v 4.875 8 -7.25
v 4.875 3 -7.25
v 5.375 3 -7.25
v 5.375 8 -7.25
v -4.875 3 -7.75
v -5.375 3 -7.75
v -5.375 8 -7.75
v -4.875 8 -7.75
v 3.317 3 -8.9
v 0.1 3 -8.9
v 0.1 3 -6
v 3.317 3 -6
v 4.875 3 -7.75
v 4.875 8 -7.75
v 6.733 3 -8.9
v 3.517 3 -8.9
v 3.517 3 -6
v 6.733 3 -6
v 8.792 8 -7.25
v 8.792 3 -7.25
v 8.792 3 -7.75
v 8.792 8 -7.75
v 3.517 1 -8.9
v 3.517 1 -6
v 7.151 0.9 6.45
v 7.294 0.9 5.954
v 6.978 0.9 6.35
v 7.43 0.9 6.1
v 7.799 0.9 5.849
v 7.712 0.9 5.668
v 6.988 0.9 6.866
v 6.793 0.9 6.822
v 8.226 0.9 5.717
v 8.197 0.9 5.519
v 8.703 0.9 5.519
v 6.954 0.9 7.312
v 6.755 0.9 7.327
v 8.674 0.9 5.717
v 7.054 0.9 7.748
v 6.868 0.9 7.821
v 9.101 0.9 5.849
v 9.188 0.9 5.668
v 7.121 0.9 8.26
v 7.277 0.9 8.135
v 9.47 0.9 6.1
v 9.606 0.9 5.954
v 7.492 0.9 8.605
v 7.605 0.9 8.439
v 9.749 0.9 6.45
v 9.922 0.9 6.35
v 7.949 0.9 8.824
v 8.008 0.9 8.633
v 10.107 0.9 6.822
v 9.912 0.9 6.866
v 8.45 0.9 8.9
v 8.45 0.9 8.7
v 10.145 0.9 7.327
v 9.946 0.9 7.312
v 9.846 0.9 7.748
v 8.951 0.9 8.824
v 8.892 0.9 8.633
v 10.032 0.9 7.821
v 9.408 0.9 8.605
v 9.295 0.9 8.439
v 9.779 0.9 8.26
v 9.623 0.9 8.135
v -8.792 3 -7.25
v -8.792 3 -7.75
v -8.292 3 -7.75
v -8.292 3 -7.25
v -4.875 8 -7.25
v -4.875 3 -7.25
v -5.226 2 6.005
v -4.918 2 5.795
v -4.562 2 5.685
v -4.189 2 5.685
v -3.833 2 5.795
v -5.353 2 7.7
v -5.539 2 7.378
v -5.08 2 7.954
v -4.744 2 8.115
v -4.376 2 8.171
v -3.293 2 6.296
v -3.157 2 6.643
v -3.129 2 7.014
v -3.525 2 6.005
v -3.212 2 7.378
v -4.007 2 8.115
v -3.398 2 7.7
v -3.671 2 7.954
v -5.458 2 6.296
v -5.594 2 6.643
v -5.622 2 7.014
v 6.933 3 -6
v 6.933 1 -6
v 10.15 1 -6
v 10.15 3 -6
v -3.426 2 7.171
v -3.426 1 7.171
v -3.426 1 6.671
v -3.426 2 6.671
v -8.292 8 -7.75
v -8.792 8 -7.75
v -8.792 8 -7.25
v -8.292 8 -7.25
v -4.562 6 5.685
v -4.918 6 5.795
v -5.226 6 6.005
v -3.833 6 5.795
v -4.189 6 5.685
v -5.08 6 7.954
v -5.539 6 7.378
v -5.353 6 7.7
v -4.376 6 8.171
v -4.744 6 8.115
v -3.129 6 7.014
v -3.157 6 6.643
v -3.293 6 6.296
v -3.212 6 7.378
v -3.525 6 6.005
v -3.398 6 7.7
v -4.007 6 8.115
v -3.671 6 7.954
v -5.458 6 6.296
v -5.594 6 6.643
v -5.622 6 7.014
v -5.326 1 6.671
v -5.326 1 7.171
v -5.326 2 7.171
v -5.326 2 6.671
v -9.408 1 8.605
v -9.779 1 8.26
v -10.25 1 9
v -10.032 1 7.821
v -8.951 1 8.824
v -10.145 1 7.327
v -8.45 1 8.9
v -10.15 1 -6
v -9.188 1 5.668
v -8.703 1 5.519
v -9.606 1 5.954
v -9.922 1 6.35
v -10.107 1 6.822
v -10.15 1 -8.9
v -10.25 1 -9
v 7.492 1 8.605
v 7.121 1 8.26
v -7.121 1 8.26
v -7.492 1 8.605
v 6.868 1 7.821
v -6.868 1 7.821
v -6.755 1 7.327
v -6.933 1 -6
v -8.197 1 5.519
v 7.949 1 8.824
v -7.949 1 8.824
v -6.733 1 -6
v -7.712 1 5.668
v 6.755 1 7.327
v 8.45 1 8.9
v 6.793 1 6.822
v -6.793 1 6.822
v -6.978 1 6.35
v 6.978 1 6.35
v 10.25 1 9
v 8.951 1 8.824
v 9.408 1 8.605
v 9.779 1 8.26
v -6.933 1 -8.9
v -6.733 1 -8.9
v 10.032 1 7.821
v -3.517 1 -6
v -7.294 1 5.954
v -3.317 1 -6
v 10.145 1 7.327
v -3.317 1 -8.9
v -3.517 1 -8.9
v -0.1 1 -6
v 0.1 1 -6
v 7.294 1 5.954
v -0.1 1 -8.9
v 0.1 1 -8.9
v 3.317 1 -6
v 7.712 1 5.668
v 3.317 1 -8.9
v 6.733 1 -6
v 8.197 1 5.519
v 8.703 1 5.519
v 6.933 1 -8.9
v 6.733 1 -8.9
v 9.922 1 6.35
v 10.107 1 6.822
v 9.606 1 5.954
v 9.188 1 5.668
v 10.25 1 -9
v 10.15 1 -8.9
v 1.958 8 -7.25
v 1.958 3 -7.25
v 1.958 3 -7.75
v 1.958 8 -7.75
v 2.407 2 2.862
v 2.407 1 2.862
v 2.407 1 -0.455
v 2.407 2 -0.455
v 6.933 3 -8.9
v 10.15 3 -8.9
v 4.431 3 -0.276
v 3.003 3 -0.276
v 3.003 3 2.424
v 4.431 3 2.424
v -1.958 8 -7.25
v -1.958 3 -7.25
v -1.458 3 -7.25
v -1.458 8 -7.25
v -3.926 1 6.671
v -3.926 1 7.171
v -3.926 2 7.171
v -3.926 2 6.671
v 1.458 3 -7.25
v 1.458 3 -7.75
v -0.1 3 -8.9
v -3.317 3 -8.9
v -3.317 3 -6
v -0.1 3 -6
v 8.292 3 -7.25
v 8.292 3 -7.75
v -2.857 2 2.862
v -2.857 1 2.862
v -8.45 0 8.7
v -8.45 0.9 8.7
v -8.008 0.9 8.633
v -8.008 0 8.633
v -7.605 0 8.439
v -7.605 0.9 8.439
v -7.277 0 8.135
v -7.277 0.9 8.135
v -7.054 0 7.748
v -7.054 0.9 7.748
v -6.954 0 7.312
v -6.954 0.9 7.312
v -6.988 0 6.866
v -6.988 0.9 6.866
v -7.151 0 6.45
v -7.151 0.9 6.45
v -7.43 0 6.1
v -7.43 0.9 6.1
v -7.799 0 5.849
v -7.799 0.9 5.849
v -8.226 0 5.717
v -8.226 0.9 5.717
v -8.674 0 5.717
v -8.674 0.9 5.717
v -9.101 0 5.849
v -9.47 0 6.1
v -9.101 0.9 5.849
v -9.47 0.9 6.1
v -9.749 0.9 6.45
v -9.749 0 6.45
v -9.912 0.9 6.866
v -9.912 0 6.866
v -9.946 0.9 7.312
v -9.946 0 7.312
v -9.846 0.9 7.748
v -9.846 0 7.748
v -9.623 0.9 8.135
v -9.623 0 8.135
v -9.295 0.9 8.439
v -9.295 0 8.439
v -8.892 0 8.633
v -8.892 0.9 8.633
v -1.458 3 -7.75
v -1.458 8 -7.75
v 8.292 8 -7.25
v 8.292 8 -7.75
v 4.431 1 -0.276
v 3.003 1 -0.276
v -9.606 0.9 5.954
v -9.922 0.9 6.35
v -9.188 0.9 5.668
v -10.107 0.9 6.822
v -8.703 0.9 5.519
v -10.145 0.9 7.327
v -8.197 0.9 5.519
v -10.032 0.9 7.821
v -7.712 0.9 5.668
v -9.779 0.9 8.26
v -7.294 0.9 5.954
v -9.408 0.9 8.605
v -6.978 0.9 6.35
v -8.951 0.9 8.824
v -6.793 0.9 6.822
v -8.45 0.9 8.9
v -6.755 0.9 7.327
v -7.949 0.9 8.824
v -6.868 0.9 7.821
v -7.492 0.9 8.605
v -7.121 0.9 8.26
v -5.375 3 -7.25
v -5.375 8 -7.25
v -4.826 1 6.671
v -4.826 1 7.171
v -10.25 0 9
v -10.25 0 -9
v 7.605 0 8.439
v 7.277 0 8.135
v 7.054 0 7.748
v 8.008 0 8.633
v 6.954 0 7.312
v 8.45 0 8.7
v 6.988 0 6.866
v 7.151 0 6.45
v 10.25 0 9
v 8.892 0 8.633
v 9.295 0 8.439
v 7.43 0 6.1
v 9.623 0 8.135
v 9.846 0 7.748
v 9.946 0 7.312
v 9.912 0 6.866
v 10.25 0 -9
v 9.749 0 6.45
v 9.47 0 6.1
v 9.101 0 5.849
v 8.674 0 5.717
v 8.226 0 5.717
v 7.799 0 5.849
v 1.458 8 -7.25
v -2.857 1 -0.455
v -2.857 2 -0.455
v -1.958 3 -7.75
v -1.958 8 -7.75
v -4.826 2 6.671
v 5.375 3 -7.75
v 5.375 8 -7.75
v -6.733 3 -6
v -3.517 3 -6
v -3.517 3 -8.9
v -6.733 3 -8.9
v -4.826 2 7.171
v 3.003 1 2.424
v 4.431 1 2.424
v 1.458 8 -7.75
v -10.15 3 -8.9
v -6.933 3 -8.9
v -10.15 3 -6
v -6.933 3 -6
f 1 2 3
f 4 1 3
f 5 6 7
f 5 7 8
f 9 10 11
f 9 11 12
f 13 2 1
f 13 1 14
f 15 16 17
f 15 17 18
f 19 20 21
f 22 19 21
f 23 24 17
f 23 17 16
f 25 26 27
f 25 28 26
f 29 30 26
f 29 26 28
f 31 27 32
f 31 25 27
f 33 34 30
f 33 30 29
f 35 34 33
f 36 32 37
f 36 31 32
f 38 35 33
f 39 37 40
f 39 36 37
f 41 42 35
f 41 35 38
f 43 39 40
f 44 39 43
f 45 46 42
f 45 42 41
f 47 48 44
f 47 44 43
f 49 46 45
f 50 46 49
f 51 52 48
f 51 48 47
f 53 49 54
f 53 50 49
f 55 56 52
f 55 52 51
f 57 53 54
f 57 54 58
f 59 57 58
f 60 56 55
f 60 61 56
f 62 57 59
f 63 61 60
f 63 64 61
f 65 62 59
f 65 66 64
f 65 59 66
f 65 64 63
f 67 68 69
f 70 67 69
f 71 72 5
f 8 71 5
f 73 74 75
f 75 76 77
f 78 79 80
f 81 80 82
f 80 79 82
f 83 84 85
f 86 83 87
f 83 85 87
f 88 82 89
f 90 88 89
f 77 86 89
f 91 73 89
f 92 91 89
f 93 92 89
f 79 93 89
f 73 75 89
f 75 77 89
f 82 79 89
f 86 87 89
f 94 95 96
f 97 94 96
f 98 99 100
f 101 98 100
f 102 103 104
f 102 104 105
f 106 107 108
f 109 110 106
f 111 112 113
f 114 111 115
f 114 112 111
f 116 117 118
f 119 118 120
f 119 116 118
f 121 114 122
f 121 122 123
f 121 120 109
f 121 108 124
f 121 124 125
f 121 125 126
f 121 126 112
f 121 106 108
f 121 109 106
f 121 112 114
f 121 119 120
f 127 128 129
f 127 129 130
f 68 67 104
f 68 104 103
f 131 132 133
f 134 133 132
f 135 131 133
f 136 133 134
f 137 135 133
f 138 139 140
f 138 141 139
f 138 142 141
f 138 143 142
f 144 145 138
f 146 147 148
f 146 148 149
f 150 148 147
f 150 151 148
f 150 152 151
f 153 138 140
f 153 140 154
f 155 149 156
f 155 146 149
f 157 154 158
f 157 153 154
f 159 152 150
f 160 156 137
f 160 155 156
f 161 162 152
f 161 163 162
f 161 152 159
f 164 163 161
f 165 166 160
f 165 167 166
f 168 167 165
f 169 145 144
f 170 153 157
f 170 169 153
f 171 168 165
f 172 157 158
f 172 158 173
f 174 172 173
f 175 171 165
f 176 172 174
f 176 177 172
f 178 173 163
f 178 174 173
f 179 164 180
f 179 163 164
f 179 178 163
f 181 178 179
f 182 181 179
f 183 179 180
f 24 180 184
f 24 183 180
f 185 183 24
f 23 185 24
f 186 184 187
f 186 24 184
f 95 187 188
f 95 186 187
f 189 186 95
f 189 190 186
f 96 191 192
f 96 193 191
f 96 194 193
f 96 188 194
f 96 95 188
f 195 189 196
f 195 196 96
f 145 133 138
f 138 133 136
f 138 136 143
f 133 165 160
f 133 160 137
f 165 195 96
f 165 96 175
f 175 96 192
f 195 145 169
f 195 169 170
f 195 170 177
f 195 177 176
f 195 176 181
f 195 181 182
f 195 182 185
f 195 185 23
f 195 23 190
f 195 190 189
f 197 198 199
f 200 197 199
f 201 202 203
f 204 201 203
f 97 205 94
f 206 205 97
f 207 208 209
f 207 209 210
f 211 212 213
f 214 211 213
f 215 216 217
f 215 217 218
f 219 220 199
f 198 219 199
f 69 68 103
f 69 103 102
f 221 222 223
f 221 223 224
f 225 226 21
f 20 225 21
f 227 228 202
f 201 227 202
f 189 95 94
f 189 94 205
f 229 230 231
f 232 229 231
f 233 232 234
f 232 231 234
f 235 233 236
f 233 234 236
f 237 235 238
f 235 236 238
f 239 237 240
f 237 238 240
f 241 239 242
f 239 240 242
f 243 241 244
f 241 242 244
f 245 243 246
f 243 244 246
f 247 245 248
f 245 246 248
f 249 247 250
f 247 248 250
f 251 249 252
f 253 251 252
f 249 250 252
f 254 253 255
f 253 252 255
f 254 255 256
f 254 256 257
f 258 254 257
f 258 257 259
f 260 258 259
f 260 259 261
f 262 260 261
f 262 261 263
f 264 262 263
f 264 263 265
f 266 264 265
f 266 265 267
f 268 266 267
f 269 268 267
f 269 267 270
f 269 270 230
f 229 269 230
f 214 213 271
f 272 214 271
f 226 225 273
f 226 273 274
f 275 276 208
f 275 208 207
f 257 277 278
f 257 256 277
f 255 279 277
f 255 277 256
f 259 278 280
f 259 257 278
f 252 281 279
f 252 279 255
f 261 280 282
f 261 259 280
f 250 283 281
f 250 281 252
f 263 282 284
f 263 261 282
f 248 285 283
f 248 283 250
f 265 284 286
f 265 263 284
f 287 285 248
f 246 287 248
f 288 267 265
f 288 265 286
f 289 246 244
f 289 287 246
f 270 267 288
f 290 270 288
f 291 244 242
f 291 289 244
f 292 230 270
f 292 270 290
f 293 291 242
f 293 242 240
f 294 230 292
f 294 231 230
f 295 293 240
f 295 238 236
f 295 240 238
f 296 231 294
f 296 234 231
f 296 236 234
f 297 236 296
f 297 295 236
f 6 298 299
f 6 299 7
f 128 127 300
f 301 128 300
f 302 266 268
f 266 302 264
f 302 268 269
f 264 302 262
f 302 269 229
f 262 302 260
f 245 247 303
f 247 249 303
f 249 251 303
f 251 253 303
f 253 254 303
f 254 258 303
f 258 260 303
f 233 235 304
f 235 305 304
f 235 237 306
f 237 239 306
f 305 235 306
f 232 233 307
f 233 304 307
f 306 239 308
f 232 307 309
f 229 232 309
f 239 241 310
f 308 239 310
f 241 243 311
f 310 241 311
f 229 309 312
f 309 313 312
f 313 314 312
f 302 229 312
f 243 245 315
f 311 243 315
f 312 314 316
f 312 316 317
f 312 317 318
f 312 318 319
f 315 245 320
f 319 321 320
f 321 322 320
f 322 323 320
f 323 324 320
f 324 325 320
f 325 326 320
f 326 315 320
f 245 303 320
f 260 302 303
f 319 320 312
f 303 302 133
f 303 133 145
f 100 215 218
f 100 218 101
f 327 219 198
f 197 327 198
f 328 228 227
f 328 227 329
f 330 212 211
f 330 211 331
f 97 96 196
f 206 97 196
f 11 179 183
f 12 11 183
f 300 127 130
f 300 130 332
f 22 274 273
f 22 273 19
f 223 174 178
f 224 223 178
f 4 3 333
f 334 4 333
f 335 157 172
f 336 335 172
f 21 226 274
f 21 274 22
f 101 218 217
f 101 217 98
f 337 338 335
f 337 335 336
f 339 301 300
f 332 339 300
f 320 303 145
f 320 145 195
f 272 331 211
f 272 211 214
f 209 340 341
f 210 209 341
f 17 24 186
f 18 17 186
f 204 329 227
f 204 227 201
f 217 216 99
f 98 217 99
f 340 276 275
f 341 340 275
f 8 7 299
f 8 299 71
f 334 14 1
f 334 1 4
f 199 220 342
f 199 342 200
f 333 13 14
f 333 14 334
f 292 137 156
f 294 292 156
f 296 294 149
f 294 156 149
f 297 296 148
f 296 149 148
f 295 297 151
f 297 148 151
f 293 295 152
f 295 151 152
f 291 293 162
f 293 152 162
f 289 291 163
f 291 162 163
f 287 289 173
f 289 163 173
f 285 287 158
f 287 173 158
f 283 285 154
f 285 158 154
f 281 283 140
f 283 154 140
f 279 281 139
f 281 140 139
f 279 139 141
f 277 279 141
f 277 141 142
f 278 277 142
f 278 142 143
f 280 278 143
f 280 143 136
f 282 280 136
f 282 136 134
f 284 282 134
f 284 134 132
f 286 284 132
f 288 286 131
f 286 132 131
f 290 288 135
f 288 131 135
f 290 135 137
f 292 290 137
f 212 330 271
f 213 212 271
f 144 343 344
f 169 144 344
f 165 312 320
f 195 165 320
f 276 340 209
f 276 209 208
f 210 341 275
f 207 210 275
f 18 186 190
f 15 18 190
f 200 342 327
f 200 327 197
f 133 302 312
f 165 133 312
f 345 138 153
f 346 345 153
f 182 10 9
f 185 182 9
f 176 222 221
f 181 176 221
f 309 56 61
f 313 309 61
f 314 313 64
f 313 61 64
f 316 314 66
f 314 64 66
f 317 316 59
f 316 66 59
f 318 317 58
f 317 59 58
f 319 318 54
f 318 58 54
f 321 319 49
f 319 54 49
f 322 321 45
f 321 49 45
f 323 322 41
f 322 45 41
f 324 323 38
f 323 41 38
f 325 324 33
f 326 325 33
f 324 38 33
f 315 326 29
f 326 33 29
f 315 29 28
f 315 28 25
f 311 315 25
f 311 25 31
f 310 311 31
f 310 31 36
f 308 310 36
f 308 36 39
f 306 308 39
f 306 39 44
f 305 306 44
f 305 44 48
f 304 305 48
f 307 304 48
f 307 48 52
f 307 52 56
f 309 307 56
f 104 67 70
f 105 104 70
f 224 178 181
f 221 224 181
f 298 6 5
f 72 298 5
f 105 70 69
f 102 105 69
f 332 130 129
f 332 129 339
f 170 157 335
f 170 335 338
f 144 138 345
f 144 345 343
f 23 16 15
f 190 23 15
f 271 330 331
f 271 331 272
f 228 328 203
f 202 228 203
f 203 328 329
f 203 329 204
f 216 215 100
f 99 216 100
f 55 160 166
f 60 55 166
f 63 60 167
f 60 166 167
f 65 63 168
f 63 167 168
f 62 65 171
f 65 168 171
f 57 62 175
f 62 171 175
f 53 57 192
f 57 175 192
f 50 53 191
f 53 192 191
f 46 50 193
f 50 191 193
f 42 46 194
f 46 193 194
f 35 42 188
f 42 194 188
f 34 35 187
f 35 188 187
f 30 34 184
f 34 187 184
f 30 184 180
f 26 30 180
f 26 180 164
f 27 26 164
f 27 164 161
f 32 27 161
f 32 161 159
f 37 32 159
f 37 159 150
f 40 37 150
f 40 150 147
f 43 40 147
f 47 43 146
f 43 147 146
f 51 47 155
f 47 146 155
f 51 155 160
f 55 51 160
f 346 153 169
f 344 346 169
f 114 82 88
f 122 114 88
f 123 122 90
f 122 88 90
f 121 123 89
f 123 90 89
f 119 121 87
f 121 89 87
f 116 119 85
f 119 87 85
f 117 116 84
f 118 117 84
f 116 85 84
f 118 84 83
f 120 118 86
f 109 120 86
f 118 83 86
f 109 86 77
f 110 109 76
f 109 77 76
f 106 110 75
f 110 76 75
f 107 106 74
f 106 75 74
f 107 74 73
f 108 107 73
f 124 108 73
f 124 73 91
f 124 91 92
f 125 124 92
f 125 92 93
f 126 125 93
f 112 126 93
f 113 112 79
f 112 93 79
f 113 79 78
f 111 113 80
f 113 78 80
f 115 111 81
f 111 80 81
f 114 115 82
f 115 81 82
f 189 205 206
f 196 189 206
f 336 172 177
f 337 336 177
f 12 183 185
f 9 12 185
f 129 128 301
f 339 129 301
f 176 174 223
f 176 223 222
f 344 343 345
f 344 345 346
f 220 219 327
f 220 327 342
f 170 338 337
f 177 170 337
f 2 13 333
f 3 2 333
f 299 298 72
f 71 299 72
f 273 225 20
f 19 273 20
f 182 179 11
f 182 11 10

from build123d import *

# Parameters (mm, degrees)
SKETCH_1_W          = 20.5
SKETCH_1_H          = 18
EXTRUDE_1_DEPTH     = 1
SKETCH_2_W          = 3.216666667
SKETCH_2_H          = 3
SKETCH_2_W_2        = 3.216666666
EXTRUDE_2_DEPTH     = 2
SKETCH_3_W          = 0.5
SKETCH_3_H          = 0.5
EXTRUDE_3_DEPTH     = 5
EXTRUDE_3_2_DEPTH   = 5
EXTRUDE_3_3_DEPTH   = 5
EXTRUDE_3_4_DEPTH   = 5
EXTRUDE_3_5_DEPTH   = 5
EXTRUDE_3_6_DEPTH   = 5
SKETCH_4_W          = 20.3
SKETCH_4_H          = 0.1
CUT_EXTRUDE_1_DEPTH = 2
SKETCH_5_R          = 1.5
CUT_EXTRUDE_2_DEPTH = 22
SKETCH_6_R          = 1.7
SKETCH_6_R_2        = 1.5
CUT_EXTRUDE_3_DEPTH = 0.1
SKETCH_7_W          = 0.5
SKETCH_7_H          = 0.5
EXTRUDE_4_DEPTH     = 1
EXTRUDE_4_2_DEPTH   = 1
SKETCH_8_R          = 1.25
EXTRUDE_5_DEPTH     = 4
SKETCH_9_W          = 5.263405332
SKETCH_9_H          = 3.317744814
EXTRUDE_6_DEPTH     = 1
SKETCH_10_W         = 1.428317259
SKETCH_10_H         = 2.699182221
EXTRUDE_7_DEPTH     = 2


with BuildPart() as part:
    # 스케치1 → 보스-돌출1 (new body)
    with BuildSketch(Plane(origin=(0, 0, 0), x_dir=(1, 0, 0), z_dir=(0, 1, 0))):
        Rectangle(SKETCH_1_W, SKETCH_1_H)
    extrude(amount=EXTRUDE_1_DEPTH)

    # 스케치2 → 보스-돌출2 (add)
    with BuildSketch(Plane(origin=(0, 1, 0), x_dir=(1, 0, 0), z_dir=(0, 1, 0))):
        with Locations((-8.541666666, 7.5)):
            Rectangle(SKETCH_2_W, SKETCH_2_H)
        with Locations((-5.125, 7.5)):
            Rectangle(SKETCH_2_W_2, SKETCH_2_H)
        with Locations((-1.708333334, 7.5)):
            Rectangle(SKETCH_2_W, SKETCH_2_H)
        with Locations((1.708333334, 7.5)):
            Rectangle(SKETCH_2_W, SKETCH_2_H)
        with Locations((5.125, 7.5)):
            Rectangle(SKETCH_2_W_2, SKETCH_2_H)
        with Locations((8.541666666, 7.5)):
            Rectangle(SKETCH_2_W, SKETCH_2_H)
    extrude(amount=EXTRUDE_2_DEPTH)

    # 스케치4 → 컷-돌출1 (cut)
    with BuildSketch(Plane(origin=(0, 3, 0), x_dir=(1, 0, 0), z_dir=(0, 1, 0))):
        with Locations((0, 8.95)):
            Rectangle(SKETCH_4_W, SKETCH_4_H)
    extrude(amount=-CUT_EXTRUDE_1_DEPTH, mode=Mode.SUBTRACT)

    # 스케치5 → 컷-돌출2 (cut)
    with BuildSketch(Plane(origin=(0, 1, 0), x_dir=(1, 0, 0), z_dir=(0, 1, 0))):
        with Locations(Location((-8.45, -7.2, 0), (0, 0, 270))):
            Circle(SKETCH_5_R)
        with Locations(Location((8.45, -7.2, 0), (0, 0, 270))):
            Circle(SKETCH_5_R)
    extrude(amount=-CUT_EXTRUDE_2_DEPTH, mode=Mode.SUBTRACT)

    # 스케치6 → 컷-돌출3 (cut)
    # profile 1 of 2: a face of its own
    with BuildSketch(Plane(origin=(0, 1, 0), x_dir=(1, 0, 0), z_dir=(0, 1, 0))):
        with Locations(Location((-8.45, -7.2, 0), (0, 0, 270))):
            Circle(SKETCH_6_R)
        with Locations(Location((-8.45, -7.2, 0), (0, 0, 270))):
            Circle(SKETCH_6_R_2, mode=Mode.SUBTRACT)
    # profile 2 of 2: a face of its own
    with BuildSketch(Plane(origin=(0, 1, 0), x_dir=(1, 0, 0), z_dir=(0, 1, 0))):
        with Locations(Location((8.45, -7.2, 0), (0, 0, 270))):
            Circle(SKETCH_6_R)
        with Locations(Location((8.45, -7.2, 0), (0, 0, 270))):
            Circle(SKETCH_6_R_2, mode=Mode.SUBTRACT)
    extrude(amount=-CUT_EXTRUDE_3_DEPTH, mode=Mode.SUBTRACT)


with BuildPart() as body_2:
    # 스케치3 → 보스-돌출3 (new body)
    with BuildSketch(Plane(origin=(0, 3, 0), x_dir=(1, 0, 0), z_dir=(0, 1, 0))):
        with Locations((-8.541666667, 7.5)):
            Rectangle(SKETCH_3_W, SKETCH_3_H)
    extrude(amount=EXTRUDE_3_DEPTH)


with BuildPart() as body_3:
    # 스케치3 → Extrude 3 2 (new body)
    with BuildSketch(Plane(origin=(0, 3, 0), x_dir=(1, 0, 0), z_dir=(0, 1, 0))):
        with Locations((-5.125, 7.5)):
            Rectangle(SKETCH_3_W, SKETCH_3_H)
    extrude(amount=EXTRUDE_3_2_DEPTH)


with BuildPart() as body_4:
    # 스케치3 → Extrude 3 3 (new body)
    with BuildSketch(Plane(origin=(0, 3, 0), x_dir=(1, 0, 0), z_dir=(0, 1, 0))):
        with Locations((-1.708333333, 7.5)):
            Rectangle(SKETCH_3_W, SKETCH_3_H)
    extrude(amount=EXTRUDE_3_3_DEPTH)


with BuildPart() as body_5:
    # 스케치3 → Extrude 3 4 (new body)
    with BuildSketch(Plane(origin=(0, 3, 0), x_dir=(1, 0, 0), z_dir=(0, 1, 0))):
        with Locations((1.708333333, 7.5)):
            Rectangle(SKETCH_3_W, SKETCH_3_H)
    extrude(amount=EXTRUDE_3_4_DEPTH)


with BuildPart() as body_6:
    # 스케치3 → Extrude 3 5 (new body)
    with BuildSketch(Plane(origin=(0, 3, 0), x_dir=(1, 0, 0), z_dir=(0, 1, 0))):
        with Locations((5.125, 7.5)):
            Rectangle(SKETCH_3_W, SKETCH_3_H)
    extrude(amount=EXTRUDE_3_5_DEPTH)


with BuildPart() as body_7:
    # 스케치3 → Extrude 3 6 (new body)
    with BuildSketch(Plane(origin=(0, 3, 0), x_dir=(1, 0, 0), z_dir=(0, 1, 0))):
        with Locations((8.541666667, 7.5)):
            Rectangle(SKETCH_3_W, SKETCH_3_H)
    extrude(amount=EXTRUDE_3_6_DEPTH)


with BuildPart() as body_8:
    # 스케치7 → 보스-돌출4 (new body)
    with BuildSketch(Plane(origin=(0, 1, 0), x_dir=(1, 0, 0), z_dir=(0, 1, 0))):
        with Locations((-3.675579376, -6.920991379)):
            Rectangle(SKETCH_7_W, SKETCH_7_H)
    extrude(amount=EXTRUDE_4_DEPTH)


with BuildPart() as body_9:
    # 스케치7 → Extrude 4 2 (new body)
    with BuildSketch(Plane(origin=(0, 1, 0), x_dir=(1, 0, 0), z_dir=(0, 1, 0))):
        with Locations((-5.075579376, -6.920991379)):
            Rectangle(SKETCH_7_W, SKETCH_7_H)
    extrude(amount=EXTRUDE_4_2_DEPTH)


with BuildPart() as body_10:
    # 스케치8 → 보스-돌출5 (new body)
    with BuildSketch(Plane(origin=(0, 2, 0), x_dir=(1, 0, 0), z_dir=(0, 1, 0))):
        with Locations(Location((-4.375579376, -6.920991379, 0), (0, 0, 270))):
            Circle(SKETCH_8_R)
    extrude(amount=EXTRUDE_5_DEPTH)


with BuildPart() as body_11:
    # 스케치9 → 보스-돌출6 (new body)
    with BuildSketch(Plane(origin=(0, 1, 0), x_dir=(1, 0, 0), z_dir=(0, 1, 0))):
        with Locations((-0.224931852, -1.203385407)):
            Rectangle(SKETCH_9_W, SKETCH_9_H)
    extrude(amount=EXTRUDE_6_DEPTH)


with BuildPart() as body_12:
    # 스케치10 → 보스-돌출7 (new body)
    with BuildSketch(Plane(origin=(0, 1, 0), x_dir=(1, 0, 0), z_dir=(0, 1, 0))):
        with Locations((3.716998851, -1.074049593)):
            Rectangle(SKETCH_10_W, SKETCH_10_H)
    extrude(amount=EXTRUDE_7_DEPTH)


solid = Compound([part.part, body_2.part, body_3.part, body_4.part, body_5.part, body_6.part, body_7.part, body_8.part, body_9.part, body_10.part, body_11.part, body_12.part])
